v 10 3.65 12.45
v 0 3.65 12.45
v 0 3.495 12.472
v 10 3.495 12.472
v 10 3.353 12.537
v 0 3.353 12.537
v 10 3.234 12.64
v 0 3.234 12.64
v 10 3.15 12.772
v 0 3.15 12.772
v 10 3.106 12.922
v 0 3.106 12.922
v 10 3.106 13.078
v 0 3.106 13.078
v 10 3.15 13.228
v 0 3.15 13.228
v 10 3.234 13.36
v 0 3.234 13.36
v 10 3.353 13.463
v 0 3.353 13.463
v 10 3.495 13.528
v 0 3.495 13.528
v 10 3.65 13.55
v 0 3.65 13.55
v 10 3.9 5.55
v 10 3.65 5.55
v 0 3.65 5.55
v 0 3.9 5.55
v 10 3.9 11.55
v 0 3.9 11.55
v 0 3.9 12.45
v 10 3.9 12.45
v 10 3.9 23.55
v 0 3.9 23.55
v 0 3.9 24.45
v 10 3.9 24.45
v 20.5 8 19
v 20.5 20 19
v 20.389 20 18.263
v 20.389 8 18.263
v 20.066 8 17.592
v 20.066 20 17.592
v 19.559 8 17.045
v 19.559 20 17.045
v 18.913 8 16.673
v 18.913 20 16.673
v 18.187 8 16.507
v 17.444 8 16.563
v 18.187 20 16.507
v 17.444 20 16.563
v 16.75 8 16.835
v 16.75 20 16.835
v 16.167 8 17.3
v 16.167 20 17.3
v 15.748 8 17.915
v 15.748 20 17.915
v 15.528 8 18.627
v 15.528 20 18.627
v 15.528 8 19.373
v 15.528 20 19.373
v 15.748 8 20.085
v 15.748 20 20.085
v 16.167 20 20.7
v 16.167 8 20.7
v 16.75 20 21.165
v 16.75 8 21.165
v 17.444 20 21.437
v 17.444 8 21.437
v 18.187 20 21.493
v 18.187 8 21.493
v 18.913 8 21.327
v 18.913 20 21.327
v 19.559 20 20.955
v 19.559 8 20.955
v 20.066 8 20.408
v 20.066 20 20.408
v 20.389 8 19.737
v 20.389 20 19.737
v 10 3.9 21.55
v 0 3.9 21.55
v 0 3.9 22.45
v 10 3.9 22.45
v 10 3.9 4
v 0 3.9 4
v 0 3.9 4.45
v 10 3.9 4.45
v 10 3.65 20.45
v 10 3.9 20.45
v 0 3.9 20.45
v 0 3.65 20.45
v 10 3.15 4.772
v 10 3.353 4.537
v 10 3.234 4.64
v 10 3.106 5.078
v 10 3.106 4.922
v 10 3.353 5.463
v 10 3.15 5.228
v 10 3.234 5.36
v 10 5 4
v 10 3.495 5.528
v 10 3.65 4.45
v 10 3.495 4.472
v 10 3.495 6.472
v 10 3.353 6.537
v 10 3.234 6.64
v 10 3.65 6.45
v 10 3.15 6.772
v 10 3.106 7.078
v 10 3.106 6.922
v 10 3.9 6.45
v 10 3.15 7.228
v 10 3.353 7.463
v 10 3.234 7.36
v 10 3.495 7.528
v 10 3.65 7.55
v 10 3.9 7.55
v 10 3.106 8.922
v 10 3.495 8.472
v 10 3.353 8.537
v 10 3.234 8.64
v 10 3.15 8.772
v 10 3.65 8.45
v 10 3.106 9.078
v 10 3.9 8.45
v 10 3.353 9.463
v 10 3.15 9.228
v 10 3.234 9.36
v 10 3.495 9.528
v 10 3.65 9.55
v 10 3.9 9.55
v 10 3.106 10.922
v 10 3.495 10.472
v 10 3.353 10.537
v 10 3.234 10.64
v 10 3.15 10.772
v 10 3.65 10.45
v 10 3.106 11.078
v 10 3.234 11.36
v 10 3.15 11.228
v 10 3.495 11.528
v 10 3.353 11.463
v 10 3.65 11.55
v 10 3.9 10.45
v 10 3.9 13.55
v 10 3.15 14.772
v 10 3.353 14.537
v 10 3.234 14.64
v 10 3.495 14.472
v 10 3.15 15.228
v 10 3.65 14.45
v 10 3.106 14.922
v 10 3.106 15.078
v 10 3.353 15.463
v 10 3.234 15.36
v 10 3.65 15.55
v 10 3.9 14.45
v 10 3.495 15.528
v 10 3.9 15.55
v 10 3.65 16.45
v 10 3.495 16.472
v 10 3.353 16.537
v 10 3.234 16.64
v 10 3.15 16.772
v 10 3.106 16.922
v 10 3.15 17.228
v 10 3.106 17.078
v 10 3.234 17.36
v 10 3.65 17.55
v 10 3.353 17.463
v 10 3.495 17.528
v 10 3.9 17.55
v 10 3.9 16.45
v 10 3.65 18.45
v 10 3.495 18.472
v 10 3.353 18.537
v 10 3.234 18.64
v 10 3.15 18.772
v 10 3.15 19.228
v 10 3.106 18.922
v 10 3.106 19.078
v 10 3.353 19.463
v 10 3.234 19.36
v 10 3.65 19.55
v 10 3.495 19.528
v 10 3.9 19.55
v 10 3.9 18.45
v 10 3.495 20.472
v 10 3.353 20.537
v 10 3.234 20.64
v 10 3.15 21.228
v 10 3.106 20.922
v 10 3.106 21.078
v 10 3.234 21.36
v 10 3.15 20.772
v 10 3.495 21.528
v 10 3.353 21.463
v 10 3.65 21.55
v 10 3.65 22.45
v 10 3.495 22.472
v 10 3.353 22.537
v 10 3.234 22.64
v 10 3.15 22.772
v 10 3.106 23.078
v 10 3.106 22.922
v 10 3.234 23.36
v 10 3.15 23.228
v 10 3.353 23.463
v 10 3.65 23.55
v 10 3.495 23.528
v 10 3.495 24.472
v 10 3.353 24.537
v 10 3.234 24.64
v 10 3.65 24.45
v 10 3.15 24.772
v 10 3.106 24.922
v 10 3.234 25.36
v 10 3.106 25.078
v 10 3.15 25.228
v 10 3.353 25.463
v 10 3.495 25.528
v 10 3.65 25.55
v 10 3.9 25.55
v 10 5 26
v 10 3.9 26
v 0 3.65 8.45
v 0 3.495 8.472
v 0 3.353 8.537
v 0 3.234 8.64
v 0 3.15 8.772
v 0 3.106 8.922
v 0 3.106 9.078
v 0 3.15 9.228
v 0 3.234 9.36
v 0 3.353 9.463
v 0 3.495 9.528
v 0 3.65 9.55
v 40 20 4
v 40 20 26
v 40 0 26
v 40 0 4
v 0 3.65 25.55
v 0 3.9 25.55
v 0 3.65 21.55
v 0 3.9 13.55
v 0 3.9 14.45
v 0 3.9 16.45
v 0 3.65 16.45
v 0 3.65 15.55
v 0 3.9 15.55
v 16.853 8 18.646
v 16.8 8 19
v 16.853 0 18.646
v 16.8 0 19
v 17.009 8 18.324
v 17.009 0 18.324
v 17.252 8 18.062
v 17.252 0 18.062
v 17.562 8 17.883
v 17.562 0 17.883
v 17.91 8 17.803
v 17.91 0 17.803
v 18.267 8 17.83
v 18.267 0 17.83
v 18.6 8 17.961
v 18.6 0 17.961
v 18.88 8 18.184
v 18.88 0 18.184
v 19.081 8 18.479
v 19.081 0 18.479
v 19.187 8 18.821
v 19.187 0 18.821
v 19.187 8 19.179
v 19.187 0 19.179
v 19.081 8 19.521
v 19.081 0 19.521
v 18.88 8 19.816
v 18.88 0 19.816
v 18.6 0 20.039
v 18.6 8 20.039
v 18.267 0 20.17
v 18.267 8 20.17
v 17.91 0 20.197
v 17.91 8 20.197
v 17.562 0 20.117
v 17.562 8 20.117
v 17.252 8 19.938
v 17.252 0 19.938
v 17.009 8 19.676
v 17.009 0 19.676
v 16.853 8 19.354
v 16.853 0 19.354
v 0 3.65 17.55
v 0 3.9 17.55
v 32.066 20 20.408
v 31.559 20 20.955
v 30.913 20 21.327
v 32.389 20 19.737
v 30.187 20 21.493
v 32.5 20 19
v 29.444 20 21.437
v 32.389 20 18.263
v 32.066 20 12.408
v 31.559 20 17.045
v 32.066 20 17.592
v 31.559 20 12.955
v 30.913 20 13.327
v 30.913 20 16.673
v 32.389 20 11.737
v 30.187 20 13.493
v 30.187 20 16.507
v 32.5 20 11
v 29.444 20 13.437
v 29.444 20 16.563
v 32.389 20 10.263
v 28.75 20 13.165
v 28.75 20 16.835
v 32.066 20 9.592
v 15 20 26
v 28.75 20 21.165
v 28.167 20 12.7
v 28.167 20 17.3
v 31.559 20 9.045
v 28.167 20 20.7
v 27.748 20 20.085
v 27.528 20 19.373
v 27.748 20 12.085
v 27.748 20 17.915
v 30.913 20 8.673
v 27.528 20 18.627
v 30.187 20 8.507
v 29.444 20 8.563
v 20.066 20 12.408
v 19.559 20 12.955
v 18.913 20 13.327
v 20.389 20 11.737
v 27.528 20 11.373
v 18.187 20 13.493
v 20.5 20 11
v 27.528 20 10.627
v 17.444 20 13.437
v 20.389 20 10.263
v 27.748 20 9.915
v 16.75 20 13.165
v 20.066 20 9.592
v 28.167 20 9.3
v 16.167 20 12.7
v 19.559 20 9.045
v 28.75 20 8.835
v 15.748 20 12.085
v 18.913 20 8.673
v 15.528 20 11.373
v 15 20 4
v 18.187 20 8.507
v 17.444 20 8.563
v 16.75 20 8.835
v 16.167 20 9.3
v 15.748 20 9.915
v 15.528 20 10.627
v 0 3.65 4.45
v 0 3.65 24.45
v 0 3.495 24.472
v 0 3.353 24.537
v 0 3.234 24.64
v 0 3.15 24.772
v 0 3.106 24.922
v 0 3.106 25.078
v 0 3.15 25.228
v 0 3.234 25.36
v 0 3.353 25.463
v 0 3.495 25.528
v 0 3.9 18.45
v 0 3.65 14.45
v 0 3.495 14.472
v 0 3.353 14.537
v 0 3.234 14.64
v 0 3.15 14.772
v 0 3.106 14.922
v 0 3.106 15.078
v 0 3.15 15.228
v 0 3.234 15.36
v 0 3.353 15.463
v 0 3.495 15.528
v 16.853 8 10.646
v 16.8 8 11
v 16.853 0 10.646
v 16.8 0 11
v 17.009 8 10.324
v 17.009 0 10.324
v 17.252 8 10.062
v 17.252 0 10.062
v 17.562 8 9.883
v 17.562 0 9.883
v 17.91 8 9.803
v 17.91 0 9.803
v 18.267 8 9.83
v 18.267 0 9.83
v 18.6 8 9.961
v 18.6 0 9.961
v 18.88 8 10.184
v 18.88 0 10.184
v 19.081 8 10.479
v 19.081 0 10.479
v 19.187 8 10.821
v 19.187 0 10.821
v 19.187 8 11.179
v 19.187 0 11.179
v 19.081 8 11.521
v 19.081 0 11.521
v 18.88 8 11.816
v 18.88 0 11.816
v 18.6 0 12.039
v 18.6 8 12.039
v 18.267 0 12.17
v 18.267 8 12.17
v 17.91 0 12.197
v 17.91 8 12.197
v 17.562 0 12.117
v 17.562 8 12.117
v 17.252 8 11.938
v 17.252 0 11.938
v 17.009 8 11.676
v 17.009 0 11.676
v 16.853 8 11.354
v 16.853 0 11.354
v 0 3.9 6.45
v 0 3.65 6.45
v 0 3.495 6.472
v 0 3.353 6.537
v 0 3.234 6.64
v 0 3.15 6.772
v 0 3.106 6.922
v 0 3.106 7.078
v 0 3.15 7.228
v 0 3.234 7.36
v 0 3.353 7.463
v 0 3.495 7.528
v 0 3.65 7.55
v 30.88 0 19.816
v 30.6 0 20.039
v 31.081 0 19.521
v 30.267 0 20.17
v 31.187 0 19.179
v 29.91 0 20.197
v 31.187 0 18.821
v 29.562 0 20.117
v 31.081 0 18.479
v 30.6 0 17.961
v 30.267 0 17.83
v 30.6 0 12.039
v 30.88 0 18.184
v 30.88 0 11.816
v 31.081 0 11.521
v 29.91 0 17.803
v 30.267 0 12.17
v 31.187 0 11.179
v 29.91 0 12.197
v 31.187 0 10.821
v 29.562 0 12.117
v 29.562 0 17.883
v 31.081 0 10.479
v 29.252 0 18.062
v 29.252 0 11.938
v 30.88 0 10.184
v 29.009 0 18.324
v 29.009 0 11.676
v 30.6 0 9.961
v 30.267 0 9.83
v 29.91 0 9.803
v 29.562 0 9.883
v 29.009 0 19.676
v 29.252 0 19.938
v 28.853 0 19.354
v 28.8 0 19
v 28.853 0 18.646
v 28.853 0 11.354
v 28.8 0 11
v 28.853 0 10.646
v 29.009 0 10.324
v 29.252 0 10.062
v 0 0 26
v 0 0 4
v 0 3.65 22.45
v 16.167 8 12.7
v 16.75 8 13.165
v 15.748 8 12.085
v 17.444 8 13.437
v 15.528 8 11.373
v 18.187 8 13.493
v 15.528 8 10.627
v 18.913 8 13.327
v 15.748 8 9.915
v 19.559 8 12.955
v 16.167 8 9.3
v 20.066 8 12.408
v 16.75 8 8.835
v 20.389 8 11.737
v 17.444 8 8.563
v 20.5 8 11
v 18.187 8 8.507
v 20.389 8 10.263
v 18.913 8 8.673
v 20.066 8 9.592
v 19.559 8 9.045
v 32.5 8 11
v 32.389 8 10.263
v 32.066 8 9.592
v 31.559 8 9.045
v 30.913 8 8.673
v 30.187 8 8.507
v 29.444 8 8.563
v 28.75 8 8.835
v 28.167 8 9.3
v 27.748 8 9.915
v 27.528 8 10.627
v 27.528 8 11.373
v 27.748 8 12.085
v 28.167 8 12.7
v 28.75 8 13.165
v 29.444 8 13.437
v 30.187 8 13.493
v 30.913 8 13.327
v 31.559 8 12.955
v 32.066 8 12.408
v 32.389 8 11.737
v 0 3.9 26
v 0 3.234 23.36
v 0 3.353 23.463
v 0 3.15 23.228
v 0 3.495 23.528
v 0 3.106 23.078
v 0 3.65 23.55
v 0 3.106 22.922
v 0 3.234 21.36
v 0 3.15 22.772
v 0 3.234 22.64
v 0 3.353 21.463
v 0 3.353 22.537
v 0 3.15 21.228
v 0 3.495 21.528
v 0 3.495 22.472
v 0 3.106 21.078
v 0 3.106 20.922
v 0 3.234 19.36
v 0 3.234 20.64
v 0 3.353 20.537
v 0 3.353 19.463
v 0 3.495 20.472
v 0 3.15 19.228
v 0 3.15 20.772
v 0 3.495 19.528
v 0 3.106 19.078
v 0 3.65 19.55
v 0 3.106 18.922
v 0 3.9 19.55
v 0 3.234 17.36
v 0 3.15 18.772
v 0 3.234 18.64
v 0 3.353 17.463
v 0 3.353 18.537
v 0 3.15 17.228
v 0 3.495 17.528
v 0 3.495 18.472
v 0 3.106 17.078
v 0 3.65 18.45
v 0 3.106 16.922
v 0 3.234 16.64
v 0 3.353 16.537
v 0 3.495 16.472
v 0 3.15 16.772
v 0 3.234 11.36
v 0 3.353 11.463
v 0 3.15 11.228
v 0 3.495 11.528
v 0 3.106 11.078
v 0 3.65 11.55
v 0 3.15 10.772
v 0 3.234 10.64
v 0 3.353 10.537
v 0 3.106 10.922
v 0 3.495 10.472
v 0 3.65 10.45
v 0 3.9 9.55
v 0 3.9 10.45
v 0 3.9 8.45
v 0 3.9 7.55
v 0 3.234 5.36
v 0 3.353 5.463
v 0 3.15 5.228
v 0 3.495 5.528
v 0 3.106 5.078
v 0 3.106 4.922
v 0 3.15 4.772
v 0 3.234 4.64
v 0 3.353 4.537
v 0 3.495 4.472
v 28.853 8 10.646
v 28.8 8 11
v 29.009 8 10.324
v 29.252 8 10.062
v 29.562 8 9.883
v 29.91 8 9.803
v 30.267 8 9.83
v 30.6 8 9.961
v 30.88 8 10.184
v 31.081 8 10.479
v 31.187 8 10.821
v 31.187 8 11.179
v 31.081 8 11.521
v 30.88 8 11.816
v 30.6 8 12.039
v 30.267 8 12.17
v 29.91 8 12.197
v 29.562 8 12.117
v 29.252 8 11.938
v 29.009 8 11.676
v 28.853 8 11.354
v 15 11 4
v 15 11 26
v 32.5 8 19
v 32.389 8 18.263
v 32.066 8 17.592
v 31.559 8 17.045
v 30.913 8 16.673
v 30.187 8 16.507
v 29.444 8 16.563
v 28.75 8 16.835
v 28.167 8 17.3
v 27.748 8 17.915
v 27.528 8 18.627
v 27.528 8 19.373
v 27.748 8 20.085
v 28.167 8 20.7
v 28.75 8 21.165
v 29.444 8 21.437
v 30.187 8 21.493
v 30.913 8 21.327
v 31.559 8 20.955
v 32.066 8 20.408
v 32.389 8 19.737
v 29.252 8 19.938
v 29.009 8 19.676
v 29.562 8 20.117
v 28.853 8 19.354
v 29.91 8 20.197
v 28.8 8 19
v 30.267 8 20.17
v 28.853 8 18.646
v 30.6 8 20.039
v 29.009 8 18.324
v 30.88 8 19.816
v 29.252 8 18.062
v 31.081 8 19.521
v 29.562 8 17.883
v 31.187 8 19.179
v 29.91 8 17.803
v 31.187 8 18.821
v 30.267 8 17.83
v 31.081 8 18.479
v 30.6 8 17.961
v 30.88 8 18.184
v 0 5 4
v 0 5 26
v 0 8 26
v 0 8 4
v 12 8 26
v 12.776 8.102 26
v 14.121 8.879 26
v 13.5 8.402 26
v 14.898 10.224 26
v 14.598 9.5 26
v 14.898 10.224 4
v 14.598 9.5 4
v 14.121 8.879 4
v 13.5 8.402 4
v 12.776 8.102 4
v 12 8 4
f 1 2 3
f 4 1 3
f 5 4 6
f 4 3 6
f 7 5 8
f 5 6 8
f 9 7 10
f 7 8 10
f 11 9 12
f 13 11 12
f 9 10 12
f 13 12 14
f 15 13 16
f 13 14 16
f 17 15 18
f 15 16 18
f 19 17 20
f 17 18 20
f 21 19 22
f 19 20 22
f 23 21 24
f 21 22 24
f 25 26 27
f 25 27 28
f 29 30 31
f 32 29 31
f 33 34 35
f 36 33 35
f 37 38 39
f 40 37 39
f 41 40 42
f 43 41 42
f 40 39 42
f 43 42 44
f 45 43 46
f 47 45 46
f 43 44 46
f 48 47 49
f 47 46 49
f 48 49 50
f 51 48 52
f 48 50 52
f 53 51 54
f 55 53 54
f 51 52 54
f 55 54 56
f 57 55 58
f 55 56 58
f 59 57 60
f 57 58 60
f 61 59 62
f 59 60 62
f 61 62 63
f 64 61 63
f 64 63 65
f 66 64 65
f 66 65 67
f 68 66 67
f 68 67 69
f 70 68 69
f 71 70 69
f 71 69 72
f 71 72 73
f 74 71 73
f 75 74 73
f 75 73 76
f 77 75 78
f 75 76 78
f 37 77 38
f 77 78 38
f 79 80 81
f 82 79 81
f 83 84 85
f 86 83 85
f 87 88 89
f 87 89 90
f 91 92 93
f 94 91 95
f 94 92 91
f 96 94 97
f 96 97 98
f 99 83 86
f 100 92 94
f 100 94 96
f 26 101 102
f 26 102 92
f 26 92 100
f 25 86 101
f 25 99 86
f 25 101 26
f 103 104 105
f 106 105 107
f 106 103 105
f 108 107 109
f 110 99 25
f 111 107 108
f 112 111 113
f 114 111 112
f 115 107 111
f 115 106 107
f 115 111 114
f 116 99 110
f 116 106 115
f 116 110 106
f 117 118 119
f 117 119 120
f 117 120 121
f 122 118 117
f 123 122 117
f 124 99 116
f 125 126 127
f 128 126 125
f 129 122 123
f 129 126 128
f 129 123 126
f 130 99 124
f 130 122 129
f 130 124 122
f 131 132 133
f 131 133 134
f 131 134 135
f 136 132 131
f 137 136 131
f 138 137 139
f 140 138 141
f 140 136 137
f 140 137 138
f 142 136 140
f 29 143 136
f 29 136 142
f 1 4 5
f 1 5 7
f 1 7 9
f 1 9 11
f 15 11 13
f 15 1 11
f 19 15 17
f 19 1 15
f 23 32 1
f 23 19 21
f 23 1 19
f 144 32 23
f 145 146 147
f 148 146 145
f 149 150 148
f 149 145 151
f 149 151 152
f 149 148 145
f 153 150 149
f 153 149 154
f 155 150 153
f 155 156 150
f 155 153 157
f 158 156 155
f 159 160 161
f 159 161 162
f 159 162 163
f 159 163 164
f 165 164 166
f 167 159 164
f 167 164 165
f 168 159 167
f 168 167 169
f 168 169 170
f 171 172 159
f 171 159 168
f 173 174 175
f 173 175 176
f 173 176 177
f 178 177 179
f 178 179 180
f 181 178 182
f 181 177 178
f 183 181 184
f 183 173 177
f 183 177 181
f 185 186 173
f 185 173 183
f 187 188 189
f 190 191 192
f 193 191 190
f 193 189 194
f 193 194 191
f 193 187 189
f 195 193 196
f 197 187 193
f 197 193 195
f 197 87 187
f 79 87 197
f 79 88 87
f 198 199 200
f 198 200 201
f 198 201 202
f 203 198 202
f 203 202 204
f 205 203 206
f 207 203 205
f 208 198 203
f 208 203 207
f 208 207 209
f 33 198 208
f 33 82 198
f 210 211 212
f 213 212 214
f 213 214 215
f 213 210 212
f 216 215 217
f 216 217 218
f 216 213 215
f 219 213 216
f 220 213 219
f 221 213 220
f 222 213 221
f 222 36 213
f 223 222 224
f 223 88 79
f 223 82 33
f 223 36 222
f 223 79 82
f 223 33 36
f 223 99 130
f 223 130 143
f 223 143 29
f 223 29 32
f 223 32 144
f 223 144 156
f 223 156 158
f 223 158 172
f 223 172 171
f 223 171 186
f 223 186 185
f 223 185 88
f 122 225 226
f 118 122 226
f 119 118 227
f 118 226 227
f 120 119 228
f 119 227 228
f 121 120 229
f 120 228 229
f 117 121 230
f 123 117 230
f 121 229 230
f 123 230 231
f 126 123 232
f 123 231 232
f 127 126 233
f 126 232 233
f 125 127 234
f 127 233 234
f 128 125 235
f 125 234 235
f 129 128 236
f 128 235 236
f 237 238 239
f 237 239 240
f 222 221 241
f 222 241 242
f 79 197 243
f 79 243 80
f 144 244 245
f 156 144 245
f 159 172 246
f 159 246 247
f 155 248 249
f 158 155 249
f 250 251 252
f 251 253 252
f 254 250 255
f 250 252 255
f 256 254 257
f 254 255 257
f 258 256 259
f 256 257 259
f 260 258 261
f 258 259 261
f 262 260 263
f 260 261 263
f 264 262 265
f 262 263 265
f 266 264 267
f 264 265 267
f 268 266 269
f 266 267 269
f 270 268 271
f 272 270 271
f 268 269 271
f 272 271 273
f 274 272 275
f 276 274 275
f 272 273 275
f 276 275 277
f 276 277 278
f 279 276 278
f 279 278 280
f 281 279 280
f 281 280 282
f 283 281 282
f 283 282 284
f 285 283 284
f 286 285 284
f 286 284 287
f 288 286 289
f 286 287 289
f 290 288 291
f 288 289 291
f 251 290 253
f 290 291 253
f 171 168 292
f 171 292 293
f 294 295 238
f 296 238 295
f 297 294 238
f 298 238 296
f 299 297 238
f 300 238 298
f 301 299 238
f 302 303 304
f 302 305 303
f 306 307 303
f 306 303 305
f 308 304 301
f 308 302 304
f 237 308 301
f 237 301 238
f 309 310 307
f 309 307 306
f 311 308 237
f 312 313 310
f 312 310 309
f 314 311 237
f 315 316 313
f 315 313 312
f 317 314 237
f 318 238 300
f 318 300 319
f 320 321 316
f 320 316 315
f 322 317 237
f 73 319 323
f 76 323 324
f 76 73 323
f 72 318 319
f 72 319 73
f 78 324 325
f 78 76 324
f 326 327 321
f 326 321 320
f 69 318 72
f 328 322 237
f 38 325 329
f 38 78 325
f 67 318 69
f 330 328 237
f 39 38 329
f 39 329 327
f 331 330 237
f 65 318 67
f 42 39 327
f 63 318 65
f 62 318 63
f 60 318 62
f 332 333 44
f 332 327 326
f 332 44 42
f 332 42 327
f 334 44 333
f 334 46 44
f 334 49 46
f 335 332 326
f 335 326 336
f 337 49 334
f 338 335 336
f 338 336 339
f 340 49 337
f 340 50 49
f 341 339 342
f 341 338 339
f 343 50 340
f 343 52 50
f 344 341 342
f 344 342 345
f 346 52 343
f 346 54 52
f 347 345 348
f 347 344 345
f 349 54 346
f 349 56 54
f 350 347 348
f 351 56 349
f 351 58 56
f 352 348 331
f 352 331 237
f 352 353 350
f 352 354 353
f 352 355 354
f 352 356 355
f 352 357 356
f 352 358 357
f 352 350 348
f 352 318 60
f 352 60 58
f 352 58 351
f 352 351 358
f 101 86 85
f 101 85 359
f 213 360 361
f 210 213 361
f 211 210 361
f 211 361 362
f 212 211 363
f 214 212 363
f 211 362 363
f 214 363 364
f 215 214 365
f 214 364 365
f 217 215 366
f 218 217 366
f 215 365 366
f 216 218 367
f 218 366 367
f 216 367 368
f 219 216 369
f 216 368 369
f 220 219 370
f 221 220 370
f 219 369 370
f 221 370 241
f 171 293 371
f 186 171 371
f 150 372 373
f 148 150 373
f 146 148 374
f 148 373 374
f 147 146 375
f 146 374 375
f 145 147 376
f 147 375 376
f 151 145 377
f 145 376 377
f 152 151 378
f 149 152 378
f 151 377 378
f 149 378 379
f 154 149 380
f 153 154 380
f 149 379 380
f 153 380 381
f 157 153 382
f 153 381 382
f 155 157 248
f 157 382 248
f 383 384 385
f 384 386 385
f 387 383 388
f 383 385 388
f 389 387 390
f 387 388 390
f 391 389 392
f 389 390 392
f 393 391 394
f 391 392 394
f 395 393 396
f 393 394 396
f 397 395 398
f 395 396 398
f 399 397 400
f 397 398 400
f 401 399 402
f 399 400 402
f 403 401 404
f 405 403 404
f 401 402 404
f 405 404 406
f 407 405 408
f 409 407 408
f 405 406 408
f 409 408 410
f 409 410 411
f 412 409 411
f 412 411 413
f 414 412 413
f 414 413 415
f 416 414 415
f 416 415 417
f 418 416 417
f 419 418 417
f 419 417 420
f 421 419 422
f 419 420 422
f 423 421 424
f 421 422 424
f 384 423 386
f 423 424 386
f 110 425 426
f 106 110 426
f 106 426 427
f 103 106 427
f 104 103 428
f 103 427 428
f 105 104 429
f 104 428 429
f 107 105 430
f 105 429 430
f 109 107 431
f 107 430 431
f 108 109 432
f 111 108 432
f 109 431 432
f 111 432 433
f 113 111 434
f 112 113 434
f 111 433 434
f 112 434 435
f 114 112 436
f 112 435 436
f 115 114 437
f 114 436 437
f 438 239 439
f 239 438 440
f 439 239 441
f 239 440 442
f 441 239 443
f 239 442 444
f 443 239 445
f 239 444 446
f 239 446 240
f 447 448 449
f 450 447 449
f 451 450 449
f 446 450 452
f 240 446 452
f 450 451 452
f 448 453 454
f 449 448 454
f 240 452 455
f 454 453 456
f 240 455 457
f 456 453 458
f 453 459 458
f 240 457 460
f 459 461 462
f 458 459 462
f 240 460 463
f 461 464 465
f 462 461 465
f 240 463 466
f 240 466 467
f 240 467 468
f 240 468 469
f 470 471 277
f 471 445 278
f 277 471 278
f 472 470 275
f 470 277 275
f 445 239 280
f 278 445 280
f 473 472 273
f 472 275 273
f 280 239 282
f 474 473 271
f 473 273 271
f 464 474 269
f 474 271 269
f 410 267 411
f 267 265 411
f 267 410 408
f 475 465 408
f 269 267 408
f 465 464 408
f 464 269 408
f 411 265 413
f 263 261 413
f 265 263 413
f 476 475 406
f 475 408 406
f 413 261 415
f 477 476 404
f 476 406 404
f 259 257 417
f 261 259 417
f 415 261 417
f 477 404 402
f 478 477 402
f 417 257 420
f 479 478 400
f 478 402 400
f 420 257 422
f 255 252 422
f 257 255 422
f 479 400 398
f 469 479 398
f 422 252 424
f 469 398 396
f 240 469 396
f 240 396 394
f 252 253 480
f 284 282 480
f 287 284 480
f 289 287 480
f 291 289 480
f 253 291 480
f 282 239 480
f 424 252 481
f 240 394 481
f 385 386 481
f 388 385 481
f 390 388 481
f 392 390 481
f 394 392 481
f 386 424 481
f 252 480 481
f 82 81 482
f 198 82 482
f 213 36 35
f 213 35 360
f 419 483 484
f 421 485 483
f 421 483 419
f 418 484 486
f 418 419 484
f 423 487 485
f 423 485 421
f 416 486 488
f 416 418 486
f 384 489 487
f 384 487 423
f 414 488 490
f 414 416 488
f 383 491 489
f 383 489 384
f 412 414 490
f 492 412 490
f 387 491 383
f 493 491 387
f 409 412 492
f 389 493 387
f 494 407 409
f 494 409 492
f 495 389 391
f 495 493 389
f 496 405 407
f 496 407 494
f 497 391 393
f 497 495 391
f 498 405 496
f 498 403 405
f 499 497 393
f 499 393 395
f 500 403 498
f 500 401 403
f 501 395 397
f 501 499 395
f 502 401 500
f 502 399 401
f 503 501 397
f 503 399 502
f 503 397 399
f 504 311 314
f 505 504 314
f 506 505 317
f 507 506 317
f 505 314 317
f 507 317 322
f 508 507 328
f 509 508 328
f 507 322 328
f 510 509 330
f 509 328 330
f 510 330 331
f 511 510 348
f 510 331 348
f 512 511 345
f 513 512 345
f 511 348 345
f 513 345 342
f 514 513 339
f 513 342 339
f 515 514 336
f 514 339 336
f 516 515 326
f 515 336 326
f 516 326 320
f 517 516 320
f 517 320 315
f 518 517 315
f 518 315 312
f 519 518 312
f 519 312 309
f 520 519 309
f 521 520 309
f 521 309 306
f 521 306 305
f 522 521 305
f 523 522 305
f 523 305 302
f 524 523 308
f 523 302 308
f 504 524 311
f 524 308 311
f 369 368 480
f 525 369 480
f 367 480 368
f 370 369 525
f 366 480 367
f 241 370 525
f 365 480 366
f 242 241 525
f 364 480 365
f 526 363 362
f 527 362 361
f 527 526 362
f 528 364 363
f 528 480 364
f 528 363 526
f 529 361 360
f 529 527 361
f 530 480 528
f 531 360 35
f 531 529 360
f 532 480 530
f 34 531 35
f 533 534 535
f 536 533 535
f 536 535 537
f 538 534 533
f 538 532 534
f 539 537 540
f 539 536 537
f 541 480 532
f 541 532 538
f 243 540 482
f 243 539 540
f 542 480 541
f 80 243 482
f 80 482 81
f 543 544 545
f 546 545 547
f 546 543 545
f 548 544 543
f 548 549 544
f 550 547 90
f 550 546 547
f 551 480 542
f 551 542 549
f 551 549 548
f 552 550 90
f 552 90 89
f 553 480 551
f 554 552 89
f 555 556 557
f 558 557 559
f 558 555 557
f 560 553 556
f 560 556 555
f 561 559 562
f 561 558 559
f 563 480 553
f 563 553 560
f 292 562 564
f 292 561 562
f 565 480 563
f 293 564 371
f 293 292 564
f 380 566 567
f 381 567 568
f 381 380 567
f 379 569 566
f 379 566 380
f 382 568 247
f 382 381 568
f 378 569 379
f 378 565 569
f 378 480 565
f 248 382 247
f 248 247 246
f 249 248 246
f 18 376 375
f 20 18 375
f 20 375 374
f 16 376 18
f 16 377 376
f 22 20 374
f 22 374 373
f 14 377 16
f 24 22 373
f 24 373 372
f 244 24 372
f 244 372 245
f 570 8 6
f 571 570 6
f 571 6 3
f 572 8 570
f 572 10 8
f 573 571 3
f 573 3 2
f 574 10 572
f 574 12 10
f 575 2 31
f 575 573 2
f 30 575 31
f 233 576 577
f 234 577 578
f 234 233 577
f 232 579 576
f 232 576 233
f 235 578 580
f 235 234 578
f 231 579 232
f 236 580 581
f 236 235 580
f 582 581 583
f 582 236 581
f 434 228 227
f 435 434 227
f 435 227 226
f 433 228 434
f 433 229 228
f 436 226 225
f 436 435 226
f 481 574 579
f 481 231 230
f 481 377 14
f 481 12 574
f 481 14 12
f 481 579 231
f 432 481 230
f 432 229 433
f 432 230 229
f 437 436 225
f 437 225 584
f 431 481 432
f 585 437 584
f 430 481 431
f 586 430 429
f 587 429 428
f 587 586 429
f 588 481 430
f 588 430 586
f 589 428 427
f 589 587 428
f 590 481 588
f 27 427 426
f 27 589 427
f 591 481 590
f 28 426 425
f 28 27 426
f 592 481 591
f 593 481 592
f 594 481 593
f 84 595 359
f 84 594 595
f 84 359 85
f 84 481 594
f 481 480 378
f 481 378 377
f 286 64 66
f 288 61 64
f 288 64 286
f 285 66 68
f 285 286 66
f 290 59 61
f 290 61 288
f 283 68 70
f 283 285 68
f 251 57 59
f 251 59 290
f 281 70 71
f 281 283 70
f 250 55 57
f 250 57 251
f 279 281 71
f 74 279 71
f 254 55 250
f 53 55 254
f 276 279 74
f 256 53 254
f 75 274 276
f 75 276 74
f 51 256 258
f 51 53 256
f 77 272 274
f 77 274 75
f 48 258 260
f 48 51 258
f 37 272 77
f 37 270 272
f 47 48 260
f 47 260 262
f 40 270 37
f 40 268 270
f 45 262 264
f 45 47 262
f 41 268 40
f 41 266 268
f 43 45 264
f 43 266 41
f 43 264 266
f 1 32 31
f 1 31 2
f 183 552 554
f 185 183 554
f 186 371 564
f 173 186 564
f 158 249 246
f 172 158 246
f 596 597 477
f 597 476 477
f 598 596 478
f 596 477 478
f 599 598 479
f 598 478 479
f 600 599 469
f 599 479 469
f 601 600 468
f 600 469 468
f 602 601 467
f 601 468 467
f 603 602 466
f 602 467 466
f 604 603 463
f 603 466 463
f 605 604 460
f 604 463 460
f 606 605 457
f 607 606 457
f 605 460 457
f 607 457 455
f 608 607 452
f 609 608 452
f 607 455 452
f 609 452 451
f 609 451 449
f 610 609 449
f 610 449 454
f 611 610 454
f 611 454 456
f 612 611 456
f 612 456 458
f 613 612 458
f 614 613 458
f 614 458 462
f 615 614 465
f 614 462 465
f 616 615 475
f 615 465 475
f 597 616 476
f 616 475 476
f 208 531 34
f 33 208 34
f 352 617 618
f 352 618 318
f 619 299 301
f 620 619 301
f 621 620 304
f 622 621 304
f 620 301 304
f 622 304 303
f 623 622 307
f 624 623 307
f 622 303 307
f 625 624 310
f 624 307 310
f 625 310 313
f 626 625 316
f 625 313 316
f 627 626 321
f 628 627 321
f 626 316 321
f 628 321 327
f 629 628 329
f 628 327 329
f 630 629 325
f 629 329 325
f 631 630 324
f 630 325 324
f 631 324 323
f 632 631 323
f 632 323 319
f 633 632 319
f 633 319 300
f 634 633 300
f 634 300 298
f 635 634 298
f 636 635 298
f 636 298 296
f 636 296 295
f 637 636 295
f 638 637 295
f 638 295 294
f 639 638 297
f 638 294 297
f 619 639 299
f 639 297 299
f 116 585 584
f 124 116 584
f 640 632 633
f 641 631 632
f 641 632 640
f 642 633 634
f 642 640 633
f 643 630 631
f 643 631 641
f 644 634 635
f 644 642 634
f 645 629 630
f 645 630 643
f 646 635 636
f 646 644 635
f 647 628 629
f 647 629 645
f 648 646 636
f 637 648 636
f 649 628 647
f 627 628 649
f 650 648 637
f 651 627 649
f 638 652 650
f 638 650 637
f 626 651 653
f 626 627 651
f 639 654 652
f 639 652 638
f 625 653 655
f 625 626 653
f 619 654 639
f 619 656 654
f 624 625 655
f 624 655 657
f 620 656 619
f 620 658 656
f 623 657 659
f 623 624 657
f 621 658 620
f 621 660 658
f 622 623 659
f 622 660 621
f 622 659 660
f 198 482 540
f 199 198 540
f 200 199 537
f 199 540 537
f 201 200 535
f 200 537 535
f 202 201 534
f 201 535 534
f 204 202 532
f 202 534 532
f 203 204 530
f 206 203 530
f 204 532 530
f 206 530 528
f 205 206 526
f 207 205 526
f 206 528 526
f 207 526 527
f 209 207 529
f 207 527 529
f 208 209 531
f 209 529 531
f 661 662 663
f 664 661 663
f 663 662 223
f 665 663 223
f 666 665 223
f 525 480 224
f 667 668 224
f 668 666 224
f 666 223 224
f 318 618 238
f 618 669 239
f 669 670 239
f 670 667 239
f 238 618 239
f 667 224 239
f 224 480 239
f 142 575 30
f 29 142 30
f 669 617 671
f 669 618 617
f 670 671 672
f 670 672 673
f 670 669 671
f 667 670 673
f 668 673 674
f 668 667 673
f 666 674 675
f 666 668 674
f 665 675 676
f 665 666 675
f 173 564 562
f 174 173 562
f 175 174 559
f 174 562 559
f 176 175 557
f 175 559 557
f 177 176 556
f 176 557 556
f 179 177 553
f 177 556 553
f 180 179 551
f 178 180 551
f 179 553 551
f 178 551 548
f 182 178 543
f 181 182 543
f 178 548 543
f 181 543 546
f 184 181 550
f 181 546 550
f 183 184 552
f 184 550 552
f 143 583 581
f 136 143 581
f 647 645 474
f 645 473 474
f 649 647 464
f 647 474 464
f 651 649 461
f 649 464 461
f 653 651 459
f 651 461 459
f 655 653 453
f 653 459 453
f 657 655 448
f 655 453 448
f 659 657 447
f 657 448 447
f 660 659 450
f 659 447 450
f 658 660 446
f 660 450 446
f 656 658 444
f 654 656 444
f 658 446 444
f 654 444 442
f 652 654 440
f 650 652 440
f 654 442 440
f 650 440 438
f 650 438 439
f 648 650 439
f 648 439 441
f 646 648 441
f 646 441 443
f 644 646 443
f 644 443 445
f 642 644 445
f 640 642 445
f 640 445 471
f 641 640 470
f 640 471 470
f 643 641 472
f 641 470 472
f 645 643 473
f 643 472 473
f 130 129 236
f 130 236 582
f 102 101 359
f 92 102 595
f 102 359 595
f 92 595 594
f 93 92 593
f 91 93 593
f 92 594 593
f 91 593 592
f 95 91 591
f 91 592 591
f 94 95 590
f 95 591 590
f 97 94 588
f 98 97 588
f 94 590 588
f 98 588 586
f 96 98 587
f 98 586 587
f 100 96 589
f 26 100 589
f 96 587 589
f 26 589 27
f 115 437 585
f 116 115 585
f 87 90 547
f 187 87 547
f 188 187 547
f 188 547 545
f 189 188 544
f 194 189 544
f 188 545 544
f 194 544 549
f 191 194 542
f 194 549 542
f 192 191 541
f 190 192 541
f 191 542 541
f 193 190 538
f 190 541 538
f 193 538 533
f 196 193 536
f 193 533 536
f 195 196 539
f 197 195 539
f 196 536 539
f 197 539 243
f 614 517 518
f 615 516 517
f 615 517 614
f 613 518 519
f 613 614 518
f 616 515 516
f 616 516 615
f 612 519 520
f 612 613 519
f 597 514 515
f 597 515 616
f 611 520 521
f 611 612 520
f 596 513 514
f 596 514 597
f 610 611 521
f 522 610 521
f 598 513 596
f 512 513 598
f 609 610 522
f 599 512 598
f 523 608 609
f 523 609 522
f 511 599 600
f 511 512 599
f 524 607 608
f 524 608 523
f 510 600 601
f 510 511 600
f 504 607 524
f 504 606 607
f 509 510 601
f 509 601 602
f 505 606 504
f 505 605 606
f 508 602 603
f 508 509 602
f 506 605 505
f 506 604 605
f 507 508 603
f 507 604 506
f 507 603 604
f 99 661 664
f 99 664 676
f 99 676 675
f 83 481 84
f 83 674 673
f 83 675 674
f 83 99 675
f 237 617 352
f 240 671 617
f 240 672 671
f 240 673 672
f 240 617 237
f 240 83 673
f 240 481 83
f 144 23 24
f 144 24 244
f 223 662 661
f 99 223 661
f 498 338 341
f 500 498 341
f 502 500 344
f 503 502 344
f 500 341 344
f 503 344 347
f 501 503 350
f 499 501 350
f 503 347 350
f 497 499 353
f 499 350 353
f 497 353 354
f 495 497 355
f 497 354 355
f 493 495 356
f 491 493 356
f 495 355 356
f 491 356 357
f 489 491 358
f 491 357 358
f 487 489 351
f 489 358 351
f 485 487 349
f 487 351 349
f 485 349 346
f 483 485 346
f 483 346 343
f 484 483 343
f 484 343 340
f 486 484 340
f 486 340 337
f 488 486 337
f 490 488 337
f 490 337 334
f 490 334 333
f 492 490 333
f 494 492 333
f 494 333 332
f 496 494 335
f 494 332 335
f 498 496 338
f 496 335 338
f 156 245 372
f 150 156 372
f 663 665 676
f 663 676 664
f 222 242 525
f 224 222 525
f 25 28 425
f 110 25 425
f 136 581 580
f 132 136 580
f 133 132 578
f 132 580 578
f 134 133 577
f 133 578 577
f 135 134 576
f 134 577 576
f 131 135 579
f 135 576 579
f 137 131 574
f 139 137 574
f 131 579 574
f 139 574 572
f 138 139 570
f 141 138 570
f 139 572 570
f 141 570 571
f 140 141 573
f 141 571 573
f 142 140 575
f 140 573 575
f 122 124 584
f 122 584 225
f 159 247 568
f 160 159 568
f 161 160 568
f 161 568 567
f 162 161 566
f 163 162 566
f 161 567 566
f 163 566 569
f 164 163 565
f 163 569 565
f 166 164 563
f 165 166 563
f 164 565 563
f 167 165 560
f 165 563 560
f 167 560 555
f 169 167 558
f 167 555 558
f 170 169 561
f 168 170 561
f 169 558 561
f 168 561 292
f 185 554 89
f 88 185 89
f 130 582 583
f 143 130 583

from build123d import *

# Parameters (mm, degrees)
SKETCH_1_W                   = 20
SKETCH_1_H                   = 30
EXTRUDE_1_DEPTH              = 30
CUT_EXTRUDE_1_DEPTH          = 10
SKETCH_15_W                  = 20
SKETCH_15_H                  = 30
CUT_EXTRUDE_6_DEPTH          = 10
SKETCH_16_W                  = 30
SKETCH_16_H                  = 20
EXTRUDE_5_DEPTH              = 20
HOLE_WIZARD_M2_2_D           = 2.4
HOLE_WIZARD_M2_2_CSINK_D     = 2.45
HOLE_WIZARD_M2_2_CSINK_ANGLE = 90
SKETCH_20_R                  = 2.5
CUT_EXTRUDE_7_DEPTH          = 12
SKETCH_21_W                  = 15
SKETCH_21_H                  = 12
CUT_EXTRUDE_8_DEPTH          = 31
SKETCH_22_W                  = 40
SKETCH_22_H                  = 4
CUT_EXTRUDE_9_DEPTH          = 21
FILLET_1_R                   = 3


with BuildPart() as part:
    # 草图1 → 凸台-拉伸1 (new body)
    with BuildSketch(Plane.XY):
        with Locations((10, 15)):
            Rectangle(SKETCH_1_W, SKETCH_1_H)
    extrude(amount=EXTRUDE_1_DEPTH)

    # 草图3 → 切除-拉伸1 (cut)
    with BuildSketch(Plane.ZY):
        with BuildLine():
            Line((11.550000034, 3.65), (11.550000034, 3.899807334))
            Line((11.550000034, 3.899807334), (12.450000034, 3.899807334))
            Line((12.450000034, 3.899807334), (12.450000034, 3.649807334))
            ThreePointArc((12.450000034, 3.649807334), (13, 3.1), (13.549999966, 3.649807334))
            Line((13.549999966, 3.649807334), (13.549999966, 3.899807334))
            Line((13.549999966, 3.899807334), (14.449999966, 3.899807334))
            Line((14.449999966, 3.899807334), (14.449999966, 3.65))
            ThreePointArc((14.449999966, 3.65), (15, 3.099999966), (15.550000034, 3.65))
            Line((15.550000034, 3.65), (15.550000034, 3.899807334))
            Line((15.550000034, 3.899807334), (16.450000034, 3.899807334))
            Line((16.450000034, 3.899807334), (16.450000034, 3.649807334))
            ThreePointArc((16.450000034, 3.649807334), (17, 3.1), (17.549999966, 3.649807334))
            Line((17.549999966, 3.649807334), (17.549999966, 3.899807334))
            Line((17.549999966, 3.899807334), (18.449999966, 3.899807334))
            Line((18.449999966, 3.899807334), (18.449999966, 3.65))
            ThreePointArc((18.449999966, 3.65), (19, 3.099999966), (19.550000034, 3.65))
            Line((19.550000034, 3.65), (19.550000034, 3.899807334))
            Line((19.550000034, 3.899807334), (20.450000034, 3.899807334))
            Line((20.450000034, 3.899807334), (20.450000034, 3.649807334))
            ThreePointArc((20.450000034, 3.649807334), (21, 3.1), (21.549999966, 3.649807334))
            Line((21.549999966, 3.649807334), (21.549999966, 3.899807334))
            Line((21.549999966, 3.899807334), (22.449999966, 3.899807334))
            Line((22.449999966, 3.899807334), (22.449999966, 3.65))
            ThreePointArc((22.449999966, 3.65), (23, 3.099999966), (23.550000034, 3.65))
            Line((23.550000034, 3.65), (23.550000034, 3.899807334))
            Line((23.550000034, 3.899807334), (24.450000034, 3.899807334))
            Line((24.450000034, 3.899807334), (24.450000034, 3.649807334))
            ThreePointArc((24.450000034, 3.649807334), (25, 3.1), (25.549999966, 3.649807334))
            Line((25.549999966, 3.649807334), (25.549999966, 3.899807334))
            Line((25.549999966, 3.899807334), (26.449999966, 3.899807334))
            Line((26.449999966, 3.899807334), (26.449999966, 3.65))
            ThreePointArc((26.449999966, 3.65), (27, 3.099999966), (27.550000034, 3.65))
            Line((27.550000034, 3.65), (27.550000034, 3.899807334))
            Line((27.550000034, 3.899807334), (28.450000034, 3.899807334))
            Line((28.450000034, 3.899807334), (28.450000034, 3.649807334))
            ThreePointArc((28.450000034, 3.649807334), (29, 3.1), (29.549999966, 3.649807334))
            Line((29.549999966, 3.649807334), (29.549999966, 3.899807334))
            Line((29.549999966, 3.899807334), (30.449999966, 3.899807334))
            Line((30.449999966, 3.899807334), (30.449999966, 3.65))
            ThreePointArc((30.449999966, 3.65), (30.61109127, 3.26109127), (31, 3.1))
            Line((31, 3.1), (31, 5))
            Line((31, 5), (15, 5))
            Line((15, 5), (-1, 5))
            Line((-1, 5), (-1, 3.1))
            ThreePointArc((-1, 3.1), (-0.61109127, 3.26109127), (-0.449999966, 3.65))
            Line((-0.449999966, 3.65), (-0.449999966, 3.899807334))
            Line((-0.449999966, 3.899807334), (0.450000034, 3.899807334))
            Line((0.450000034, 3.899807334), (0.450000034, 3.649807334))
            ThreePointArc((0.450000034, 3.649807334), (1, 3.1), (1.549999966, 3.649807334))
            Line((1.549999966, 3.649807334), (1.549999966, 3.899807334))
            Line((1.549999966, 3.899807334), (2.449999966, 3.899807334))
            Line((2.449999966, 3.899807334), (2.449999966, 3.65))
            ThreePointArc((2.449999966, 3.65), (3, 3.099999966), (3.550000034, 3.65))
            Line((3.550000034, 3.65), (3.550000034, 3.899807334))
            Line((3.550000034, 3.899807334), (4.450000034, 3.899807334))
            Line((4.450000034, 3.899807334), (4.450000034, 3.649807334))
            ThreePointArc((4.450000034, 3.649807334), (5, 3.1), (5.549999966, 3.649807334))
            Line((5.549999966, 3.649807334), (5.549999966, 3.899807334))
            Line((5.549999966, 3.899807334), (6.449999966, 3.899807334))
            Line((6.449999966, 3.899807334), (6.449999966, 3.65))
            ThreePointArc((6.449999966, 3.65), (7, 3.099999966), (7.550000034, 3.65))
            Line((7.550000034, 3.65), (7.550000034, 3.899807334))
            Line((7.550000034, 3.899807334), (8.450000034, 3.899807334))
            Line((8.450000034, 3.899807334), (8.450000034, 3.649807334))
            ThreePointArc((8.450000034, 3.649807334), (9, 3.1), (9.549999966, 3.649807334))
            Line((9.549999966, 3.649807334), (9.549999966, 3.899807334))
            Line((9.549999966, 3.899807334), (10.449999966, 3.899807334))
            Line((10.449999966, 3.899807334), (10.449999966, 3.65))
            ThreePointArc((10.449999966, 3.65), (11, 3.099999966), (11.550000034, 3.65))
        make_face()
    extrude(amount=-CUT_EXTRUDE_1_DEPTH, mode=Mode.SUBTRACT)

    # 草图15 → 切除-拉伸6 (cut)
    with BuildSketch(Plane(origin=(0, 30, 0), x_dir=(1, 0, 0), z_dir=(0, 1, 0))):
        with Locations((10, -15)):
            Rectangle(SKETCH_15_W, SKETCH_15_H)
    extrude(amount=-CUT_EXTRUDE_6_DEPTH, mode=Mode.SUBTRACT)

    # 草图16 → 凸台-拉伸5 (add)
    with BuildSketch(Plane(origin=(20, 0, 0), x_dir=(0, 0, -1), z_dir=(1, 0, 0))):
        with Locations((-15, 10)):
            Rectangle(SKETCH_16_W, SKETCH_16_H)
    extrude(amount=EXTRUDE_5_DEPTH)

    # M2 间隙孔2 (through all)
    with Locations(Plane(origin=(0, 20, 0), x_dir=(1, 0, 0), z_dir=(0, 1, 0))):
        with Locations((18, -19), (18, -11), (30, -11), (30, -19)):
            CounterSinkHole(HOLE_WIZARD_M2_2_D / 2, HOLE_WIZARD_M2_2_CSINK_D / 2, counter_sink_angle=HOLE_WIZARD_M2_2_CSINK_ANGLE)

    # 草图20 → 切除-拉伸7 (cut)
    with BuildSketch(Plane(origin=(0, 20, 0), x_dir=(1, 0, 0), z_dir=(0, 1, 0))):
        with Locations((18, -11)):
            Circle(SKETCH_20_R)
        with Locations((30, -11)):
            Circle(SKETCH_20_R)
        with Locations((30, -19)):
            Circle(SKETCH_20_R)
        with Locations((18, -19)):
            Circle(SKETCH_20_R)
    extrude(amount=-CUT_EXTRUDE_7_DEPTH, mode=Mode.SUBTRACT)

    # 草图21 → 切除-拉伸8 (cut, through all)
    with BuildSketch(Plane(origin=(0, 0, 0), x_dir=(-1, 0, 0), z_dir=(0, 0, -1))):
        with Locations((-7.5, 14)):
            Rectangle(SKETCH_21_W, SKETCH_21_H)
    extrude(amount=-CUT_EXTRUDE_8_DEPTH, mode=Mode.SUBTRACT)

    # 草图22 → 切除-拉伸9 (cut, through all)
    with BuildSketch(Plane.XZ):
        with Locations((20, 28)):
            Rectangle(SKETCH_22_W, SKETCH_22_H)
        with Locations((20, 2)):
            Rectangle(SKETCH_22_W, SKETCH_22_H)
    extrude(amount=-CUT_EXTRUDE_9_DEPTH, mode=Mode.SUBTRACT)

    # 圆角1
    fillet_1_edges = [part.edges().sort_by_distance(p)[0] for p in [
        (15, 8, 15),
    ]]
    fillet(fillet_1_edges, radius=FILLET_1_R)


solid = part.part
